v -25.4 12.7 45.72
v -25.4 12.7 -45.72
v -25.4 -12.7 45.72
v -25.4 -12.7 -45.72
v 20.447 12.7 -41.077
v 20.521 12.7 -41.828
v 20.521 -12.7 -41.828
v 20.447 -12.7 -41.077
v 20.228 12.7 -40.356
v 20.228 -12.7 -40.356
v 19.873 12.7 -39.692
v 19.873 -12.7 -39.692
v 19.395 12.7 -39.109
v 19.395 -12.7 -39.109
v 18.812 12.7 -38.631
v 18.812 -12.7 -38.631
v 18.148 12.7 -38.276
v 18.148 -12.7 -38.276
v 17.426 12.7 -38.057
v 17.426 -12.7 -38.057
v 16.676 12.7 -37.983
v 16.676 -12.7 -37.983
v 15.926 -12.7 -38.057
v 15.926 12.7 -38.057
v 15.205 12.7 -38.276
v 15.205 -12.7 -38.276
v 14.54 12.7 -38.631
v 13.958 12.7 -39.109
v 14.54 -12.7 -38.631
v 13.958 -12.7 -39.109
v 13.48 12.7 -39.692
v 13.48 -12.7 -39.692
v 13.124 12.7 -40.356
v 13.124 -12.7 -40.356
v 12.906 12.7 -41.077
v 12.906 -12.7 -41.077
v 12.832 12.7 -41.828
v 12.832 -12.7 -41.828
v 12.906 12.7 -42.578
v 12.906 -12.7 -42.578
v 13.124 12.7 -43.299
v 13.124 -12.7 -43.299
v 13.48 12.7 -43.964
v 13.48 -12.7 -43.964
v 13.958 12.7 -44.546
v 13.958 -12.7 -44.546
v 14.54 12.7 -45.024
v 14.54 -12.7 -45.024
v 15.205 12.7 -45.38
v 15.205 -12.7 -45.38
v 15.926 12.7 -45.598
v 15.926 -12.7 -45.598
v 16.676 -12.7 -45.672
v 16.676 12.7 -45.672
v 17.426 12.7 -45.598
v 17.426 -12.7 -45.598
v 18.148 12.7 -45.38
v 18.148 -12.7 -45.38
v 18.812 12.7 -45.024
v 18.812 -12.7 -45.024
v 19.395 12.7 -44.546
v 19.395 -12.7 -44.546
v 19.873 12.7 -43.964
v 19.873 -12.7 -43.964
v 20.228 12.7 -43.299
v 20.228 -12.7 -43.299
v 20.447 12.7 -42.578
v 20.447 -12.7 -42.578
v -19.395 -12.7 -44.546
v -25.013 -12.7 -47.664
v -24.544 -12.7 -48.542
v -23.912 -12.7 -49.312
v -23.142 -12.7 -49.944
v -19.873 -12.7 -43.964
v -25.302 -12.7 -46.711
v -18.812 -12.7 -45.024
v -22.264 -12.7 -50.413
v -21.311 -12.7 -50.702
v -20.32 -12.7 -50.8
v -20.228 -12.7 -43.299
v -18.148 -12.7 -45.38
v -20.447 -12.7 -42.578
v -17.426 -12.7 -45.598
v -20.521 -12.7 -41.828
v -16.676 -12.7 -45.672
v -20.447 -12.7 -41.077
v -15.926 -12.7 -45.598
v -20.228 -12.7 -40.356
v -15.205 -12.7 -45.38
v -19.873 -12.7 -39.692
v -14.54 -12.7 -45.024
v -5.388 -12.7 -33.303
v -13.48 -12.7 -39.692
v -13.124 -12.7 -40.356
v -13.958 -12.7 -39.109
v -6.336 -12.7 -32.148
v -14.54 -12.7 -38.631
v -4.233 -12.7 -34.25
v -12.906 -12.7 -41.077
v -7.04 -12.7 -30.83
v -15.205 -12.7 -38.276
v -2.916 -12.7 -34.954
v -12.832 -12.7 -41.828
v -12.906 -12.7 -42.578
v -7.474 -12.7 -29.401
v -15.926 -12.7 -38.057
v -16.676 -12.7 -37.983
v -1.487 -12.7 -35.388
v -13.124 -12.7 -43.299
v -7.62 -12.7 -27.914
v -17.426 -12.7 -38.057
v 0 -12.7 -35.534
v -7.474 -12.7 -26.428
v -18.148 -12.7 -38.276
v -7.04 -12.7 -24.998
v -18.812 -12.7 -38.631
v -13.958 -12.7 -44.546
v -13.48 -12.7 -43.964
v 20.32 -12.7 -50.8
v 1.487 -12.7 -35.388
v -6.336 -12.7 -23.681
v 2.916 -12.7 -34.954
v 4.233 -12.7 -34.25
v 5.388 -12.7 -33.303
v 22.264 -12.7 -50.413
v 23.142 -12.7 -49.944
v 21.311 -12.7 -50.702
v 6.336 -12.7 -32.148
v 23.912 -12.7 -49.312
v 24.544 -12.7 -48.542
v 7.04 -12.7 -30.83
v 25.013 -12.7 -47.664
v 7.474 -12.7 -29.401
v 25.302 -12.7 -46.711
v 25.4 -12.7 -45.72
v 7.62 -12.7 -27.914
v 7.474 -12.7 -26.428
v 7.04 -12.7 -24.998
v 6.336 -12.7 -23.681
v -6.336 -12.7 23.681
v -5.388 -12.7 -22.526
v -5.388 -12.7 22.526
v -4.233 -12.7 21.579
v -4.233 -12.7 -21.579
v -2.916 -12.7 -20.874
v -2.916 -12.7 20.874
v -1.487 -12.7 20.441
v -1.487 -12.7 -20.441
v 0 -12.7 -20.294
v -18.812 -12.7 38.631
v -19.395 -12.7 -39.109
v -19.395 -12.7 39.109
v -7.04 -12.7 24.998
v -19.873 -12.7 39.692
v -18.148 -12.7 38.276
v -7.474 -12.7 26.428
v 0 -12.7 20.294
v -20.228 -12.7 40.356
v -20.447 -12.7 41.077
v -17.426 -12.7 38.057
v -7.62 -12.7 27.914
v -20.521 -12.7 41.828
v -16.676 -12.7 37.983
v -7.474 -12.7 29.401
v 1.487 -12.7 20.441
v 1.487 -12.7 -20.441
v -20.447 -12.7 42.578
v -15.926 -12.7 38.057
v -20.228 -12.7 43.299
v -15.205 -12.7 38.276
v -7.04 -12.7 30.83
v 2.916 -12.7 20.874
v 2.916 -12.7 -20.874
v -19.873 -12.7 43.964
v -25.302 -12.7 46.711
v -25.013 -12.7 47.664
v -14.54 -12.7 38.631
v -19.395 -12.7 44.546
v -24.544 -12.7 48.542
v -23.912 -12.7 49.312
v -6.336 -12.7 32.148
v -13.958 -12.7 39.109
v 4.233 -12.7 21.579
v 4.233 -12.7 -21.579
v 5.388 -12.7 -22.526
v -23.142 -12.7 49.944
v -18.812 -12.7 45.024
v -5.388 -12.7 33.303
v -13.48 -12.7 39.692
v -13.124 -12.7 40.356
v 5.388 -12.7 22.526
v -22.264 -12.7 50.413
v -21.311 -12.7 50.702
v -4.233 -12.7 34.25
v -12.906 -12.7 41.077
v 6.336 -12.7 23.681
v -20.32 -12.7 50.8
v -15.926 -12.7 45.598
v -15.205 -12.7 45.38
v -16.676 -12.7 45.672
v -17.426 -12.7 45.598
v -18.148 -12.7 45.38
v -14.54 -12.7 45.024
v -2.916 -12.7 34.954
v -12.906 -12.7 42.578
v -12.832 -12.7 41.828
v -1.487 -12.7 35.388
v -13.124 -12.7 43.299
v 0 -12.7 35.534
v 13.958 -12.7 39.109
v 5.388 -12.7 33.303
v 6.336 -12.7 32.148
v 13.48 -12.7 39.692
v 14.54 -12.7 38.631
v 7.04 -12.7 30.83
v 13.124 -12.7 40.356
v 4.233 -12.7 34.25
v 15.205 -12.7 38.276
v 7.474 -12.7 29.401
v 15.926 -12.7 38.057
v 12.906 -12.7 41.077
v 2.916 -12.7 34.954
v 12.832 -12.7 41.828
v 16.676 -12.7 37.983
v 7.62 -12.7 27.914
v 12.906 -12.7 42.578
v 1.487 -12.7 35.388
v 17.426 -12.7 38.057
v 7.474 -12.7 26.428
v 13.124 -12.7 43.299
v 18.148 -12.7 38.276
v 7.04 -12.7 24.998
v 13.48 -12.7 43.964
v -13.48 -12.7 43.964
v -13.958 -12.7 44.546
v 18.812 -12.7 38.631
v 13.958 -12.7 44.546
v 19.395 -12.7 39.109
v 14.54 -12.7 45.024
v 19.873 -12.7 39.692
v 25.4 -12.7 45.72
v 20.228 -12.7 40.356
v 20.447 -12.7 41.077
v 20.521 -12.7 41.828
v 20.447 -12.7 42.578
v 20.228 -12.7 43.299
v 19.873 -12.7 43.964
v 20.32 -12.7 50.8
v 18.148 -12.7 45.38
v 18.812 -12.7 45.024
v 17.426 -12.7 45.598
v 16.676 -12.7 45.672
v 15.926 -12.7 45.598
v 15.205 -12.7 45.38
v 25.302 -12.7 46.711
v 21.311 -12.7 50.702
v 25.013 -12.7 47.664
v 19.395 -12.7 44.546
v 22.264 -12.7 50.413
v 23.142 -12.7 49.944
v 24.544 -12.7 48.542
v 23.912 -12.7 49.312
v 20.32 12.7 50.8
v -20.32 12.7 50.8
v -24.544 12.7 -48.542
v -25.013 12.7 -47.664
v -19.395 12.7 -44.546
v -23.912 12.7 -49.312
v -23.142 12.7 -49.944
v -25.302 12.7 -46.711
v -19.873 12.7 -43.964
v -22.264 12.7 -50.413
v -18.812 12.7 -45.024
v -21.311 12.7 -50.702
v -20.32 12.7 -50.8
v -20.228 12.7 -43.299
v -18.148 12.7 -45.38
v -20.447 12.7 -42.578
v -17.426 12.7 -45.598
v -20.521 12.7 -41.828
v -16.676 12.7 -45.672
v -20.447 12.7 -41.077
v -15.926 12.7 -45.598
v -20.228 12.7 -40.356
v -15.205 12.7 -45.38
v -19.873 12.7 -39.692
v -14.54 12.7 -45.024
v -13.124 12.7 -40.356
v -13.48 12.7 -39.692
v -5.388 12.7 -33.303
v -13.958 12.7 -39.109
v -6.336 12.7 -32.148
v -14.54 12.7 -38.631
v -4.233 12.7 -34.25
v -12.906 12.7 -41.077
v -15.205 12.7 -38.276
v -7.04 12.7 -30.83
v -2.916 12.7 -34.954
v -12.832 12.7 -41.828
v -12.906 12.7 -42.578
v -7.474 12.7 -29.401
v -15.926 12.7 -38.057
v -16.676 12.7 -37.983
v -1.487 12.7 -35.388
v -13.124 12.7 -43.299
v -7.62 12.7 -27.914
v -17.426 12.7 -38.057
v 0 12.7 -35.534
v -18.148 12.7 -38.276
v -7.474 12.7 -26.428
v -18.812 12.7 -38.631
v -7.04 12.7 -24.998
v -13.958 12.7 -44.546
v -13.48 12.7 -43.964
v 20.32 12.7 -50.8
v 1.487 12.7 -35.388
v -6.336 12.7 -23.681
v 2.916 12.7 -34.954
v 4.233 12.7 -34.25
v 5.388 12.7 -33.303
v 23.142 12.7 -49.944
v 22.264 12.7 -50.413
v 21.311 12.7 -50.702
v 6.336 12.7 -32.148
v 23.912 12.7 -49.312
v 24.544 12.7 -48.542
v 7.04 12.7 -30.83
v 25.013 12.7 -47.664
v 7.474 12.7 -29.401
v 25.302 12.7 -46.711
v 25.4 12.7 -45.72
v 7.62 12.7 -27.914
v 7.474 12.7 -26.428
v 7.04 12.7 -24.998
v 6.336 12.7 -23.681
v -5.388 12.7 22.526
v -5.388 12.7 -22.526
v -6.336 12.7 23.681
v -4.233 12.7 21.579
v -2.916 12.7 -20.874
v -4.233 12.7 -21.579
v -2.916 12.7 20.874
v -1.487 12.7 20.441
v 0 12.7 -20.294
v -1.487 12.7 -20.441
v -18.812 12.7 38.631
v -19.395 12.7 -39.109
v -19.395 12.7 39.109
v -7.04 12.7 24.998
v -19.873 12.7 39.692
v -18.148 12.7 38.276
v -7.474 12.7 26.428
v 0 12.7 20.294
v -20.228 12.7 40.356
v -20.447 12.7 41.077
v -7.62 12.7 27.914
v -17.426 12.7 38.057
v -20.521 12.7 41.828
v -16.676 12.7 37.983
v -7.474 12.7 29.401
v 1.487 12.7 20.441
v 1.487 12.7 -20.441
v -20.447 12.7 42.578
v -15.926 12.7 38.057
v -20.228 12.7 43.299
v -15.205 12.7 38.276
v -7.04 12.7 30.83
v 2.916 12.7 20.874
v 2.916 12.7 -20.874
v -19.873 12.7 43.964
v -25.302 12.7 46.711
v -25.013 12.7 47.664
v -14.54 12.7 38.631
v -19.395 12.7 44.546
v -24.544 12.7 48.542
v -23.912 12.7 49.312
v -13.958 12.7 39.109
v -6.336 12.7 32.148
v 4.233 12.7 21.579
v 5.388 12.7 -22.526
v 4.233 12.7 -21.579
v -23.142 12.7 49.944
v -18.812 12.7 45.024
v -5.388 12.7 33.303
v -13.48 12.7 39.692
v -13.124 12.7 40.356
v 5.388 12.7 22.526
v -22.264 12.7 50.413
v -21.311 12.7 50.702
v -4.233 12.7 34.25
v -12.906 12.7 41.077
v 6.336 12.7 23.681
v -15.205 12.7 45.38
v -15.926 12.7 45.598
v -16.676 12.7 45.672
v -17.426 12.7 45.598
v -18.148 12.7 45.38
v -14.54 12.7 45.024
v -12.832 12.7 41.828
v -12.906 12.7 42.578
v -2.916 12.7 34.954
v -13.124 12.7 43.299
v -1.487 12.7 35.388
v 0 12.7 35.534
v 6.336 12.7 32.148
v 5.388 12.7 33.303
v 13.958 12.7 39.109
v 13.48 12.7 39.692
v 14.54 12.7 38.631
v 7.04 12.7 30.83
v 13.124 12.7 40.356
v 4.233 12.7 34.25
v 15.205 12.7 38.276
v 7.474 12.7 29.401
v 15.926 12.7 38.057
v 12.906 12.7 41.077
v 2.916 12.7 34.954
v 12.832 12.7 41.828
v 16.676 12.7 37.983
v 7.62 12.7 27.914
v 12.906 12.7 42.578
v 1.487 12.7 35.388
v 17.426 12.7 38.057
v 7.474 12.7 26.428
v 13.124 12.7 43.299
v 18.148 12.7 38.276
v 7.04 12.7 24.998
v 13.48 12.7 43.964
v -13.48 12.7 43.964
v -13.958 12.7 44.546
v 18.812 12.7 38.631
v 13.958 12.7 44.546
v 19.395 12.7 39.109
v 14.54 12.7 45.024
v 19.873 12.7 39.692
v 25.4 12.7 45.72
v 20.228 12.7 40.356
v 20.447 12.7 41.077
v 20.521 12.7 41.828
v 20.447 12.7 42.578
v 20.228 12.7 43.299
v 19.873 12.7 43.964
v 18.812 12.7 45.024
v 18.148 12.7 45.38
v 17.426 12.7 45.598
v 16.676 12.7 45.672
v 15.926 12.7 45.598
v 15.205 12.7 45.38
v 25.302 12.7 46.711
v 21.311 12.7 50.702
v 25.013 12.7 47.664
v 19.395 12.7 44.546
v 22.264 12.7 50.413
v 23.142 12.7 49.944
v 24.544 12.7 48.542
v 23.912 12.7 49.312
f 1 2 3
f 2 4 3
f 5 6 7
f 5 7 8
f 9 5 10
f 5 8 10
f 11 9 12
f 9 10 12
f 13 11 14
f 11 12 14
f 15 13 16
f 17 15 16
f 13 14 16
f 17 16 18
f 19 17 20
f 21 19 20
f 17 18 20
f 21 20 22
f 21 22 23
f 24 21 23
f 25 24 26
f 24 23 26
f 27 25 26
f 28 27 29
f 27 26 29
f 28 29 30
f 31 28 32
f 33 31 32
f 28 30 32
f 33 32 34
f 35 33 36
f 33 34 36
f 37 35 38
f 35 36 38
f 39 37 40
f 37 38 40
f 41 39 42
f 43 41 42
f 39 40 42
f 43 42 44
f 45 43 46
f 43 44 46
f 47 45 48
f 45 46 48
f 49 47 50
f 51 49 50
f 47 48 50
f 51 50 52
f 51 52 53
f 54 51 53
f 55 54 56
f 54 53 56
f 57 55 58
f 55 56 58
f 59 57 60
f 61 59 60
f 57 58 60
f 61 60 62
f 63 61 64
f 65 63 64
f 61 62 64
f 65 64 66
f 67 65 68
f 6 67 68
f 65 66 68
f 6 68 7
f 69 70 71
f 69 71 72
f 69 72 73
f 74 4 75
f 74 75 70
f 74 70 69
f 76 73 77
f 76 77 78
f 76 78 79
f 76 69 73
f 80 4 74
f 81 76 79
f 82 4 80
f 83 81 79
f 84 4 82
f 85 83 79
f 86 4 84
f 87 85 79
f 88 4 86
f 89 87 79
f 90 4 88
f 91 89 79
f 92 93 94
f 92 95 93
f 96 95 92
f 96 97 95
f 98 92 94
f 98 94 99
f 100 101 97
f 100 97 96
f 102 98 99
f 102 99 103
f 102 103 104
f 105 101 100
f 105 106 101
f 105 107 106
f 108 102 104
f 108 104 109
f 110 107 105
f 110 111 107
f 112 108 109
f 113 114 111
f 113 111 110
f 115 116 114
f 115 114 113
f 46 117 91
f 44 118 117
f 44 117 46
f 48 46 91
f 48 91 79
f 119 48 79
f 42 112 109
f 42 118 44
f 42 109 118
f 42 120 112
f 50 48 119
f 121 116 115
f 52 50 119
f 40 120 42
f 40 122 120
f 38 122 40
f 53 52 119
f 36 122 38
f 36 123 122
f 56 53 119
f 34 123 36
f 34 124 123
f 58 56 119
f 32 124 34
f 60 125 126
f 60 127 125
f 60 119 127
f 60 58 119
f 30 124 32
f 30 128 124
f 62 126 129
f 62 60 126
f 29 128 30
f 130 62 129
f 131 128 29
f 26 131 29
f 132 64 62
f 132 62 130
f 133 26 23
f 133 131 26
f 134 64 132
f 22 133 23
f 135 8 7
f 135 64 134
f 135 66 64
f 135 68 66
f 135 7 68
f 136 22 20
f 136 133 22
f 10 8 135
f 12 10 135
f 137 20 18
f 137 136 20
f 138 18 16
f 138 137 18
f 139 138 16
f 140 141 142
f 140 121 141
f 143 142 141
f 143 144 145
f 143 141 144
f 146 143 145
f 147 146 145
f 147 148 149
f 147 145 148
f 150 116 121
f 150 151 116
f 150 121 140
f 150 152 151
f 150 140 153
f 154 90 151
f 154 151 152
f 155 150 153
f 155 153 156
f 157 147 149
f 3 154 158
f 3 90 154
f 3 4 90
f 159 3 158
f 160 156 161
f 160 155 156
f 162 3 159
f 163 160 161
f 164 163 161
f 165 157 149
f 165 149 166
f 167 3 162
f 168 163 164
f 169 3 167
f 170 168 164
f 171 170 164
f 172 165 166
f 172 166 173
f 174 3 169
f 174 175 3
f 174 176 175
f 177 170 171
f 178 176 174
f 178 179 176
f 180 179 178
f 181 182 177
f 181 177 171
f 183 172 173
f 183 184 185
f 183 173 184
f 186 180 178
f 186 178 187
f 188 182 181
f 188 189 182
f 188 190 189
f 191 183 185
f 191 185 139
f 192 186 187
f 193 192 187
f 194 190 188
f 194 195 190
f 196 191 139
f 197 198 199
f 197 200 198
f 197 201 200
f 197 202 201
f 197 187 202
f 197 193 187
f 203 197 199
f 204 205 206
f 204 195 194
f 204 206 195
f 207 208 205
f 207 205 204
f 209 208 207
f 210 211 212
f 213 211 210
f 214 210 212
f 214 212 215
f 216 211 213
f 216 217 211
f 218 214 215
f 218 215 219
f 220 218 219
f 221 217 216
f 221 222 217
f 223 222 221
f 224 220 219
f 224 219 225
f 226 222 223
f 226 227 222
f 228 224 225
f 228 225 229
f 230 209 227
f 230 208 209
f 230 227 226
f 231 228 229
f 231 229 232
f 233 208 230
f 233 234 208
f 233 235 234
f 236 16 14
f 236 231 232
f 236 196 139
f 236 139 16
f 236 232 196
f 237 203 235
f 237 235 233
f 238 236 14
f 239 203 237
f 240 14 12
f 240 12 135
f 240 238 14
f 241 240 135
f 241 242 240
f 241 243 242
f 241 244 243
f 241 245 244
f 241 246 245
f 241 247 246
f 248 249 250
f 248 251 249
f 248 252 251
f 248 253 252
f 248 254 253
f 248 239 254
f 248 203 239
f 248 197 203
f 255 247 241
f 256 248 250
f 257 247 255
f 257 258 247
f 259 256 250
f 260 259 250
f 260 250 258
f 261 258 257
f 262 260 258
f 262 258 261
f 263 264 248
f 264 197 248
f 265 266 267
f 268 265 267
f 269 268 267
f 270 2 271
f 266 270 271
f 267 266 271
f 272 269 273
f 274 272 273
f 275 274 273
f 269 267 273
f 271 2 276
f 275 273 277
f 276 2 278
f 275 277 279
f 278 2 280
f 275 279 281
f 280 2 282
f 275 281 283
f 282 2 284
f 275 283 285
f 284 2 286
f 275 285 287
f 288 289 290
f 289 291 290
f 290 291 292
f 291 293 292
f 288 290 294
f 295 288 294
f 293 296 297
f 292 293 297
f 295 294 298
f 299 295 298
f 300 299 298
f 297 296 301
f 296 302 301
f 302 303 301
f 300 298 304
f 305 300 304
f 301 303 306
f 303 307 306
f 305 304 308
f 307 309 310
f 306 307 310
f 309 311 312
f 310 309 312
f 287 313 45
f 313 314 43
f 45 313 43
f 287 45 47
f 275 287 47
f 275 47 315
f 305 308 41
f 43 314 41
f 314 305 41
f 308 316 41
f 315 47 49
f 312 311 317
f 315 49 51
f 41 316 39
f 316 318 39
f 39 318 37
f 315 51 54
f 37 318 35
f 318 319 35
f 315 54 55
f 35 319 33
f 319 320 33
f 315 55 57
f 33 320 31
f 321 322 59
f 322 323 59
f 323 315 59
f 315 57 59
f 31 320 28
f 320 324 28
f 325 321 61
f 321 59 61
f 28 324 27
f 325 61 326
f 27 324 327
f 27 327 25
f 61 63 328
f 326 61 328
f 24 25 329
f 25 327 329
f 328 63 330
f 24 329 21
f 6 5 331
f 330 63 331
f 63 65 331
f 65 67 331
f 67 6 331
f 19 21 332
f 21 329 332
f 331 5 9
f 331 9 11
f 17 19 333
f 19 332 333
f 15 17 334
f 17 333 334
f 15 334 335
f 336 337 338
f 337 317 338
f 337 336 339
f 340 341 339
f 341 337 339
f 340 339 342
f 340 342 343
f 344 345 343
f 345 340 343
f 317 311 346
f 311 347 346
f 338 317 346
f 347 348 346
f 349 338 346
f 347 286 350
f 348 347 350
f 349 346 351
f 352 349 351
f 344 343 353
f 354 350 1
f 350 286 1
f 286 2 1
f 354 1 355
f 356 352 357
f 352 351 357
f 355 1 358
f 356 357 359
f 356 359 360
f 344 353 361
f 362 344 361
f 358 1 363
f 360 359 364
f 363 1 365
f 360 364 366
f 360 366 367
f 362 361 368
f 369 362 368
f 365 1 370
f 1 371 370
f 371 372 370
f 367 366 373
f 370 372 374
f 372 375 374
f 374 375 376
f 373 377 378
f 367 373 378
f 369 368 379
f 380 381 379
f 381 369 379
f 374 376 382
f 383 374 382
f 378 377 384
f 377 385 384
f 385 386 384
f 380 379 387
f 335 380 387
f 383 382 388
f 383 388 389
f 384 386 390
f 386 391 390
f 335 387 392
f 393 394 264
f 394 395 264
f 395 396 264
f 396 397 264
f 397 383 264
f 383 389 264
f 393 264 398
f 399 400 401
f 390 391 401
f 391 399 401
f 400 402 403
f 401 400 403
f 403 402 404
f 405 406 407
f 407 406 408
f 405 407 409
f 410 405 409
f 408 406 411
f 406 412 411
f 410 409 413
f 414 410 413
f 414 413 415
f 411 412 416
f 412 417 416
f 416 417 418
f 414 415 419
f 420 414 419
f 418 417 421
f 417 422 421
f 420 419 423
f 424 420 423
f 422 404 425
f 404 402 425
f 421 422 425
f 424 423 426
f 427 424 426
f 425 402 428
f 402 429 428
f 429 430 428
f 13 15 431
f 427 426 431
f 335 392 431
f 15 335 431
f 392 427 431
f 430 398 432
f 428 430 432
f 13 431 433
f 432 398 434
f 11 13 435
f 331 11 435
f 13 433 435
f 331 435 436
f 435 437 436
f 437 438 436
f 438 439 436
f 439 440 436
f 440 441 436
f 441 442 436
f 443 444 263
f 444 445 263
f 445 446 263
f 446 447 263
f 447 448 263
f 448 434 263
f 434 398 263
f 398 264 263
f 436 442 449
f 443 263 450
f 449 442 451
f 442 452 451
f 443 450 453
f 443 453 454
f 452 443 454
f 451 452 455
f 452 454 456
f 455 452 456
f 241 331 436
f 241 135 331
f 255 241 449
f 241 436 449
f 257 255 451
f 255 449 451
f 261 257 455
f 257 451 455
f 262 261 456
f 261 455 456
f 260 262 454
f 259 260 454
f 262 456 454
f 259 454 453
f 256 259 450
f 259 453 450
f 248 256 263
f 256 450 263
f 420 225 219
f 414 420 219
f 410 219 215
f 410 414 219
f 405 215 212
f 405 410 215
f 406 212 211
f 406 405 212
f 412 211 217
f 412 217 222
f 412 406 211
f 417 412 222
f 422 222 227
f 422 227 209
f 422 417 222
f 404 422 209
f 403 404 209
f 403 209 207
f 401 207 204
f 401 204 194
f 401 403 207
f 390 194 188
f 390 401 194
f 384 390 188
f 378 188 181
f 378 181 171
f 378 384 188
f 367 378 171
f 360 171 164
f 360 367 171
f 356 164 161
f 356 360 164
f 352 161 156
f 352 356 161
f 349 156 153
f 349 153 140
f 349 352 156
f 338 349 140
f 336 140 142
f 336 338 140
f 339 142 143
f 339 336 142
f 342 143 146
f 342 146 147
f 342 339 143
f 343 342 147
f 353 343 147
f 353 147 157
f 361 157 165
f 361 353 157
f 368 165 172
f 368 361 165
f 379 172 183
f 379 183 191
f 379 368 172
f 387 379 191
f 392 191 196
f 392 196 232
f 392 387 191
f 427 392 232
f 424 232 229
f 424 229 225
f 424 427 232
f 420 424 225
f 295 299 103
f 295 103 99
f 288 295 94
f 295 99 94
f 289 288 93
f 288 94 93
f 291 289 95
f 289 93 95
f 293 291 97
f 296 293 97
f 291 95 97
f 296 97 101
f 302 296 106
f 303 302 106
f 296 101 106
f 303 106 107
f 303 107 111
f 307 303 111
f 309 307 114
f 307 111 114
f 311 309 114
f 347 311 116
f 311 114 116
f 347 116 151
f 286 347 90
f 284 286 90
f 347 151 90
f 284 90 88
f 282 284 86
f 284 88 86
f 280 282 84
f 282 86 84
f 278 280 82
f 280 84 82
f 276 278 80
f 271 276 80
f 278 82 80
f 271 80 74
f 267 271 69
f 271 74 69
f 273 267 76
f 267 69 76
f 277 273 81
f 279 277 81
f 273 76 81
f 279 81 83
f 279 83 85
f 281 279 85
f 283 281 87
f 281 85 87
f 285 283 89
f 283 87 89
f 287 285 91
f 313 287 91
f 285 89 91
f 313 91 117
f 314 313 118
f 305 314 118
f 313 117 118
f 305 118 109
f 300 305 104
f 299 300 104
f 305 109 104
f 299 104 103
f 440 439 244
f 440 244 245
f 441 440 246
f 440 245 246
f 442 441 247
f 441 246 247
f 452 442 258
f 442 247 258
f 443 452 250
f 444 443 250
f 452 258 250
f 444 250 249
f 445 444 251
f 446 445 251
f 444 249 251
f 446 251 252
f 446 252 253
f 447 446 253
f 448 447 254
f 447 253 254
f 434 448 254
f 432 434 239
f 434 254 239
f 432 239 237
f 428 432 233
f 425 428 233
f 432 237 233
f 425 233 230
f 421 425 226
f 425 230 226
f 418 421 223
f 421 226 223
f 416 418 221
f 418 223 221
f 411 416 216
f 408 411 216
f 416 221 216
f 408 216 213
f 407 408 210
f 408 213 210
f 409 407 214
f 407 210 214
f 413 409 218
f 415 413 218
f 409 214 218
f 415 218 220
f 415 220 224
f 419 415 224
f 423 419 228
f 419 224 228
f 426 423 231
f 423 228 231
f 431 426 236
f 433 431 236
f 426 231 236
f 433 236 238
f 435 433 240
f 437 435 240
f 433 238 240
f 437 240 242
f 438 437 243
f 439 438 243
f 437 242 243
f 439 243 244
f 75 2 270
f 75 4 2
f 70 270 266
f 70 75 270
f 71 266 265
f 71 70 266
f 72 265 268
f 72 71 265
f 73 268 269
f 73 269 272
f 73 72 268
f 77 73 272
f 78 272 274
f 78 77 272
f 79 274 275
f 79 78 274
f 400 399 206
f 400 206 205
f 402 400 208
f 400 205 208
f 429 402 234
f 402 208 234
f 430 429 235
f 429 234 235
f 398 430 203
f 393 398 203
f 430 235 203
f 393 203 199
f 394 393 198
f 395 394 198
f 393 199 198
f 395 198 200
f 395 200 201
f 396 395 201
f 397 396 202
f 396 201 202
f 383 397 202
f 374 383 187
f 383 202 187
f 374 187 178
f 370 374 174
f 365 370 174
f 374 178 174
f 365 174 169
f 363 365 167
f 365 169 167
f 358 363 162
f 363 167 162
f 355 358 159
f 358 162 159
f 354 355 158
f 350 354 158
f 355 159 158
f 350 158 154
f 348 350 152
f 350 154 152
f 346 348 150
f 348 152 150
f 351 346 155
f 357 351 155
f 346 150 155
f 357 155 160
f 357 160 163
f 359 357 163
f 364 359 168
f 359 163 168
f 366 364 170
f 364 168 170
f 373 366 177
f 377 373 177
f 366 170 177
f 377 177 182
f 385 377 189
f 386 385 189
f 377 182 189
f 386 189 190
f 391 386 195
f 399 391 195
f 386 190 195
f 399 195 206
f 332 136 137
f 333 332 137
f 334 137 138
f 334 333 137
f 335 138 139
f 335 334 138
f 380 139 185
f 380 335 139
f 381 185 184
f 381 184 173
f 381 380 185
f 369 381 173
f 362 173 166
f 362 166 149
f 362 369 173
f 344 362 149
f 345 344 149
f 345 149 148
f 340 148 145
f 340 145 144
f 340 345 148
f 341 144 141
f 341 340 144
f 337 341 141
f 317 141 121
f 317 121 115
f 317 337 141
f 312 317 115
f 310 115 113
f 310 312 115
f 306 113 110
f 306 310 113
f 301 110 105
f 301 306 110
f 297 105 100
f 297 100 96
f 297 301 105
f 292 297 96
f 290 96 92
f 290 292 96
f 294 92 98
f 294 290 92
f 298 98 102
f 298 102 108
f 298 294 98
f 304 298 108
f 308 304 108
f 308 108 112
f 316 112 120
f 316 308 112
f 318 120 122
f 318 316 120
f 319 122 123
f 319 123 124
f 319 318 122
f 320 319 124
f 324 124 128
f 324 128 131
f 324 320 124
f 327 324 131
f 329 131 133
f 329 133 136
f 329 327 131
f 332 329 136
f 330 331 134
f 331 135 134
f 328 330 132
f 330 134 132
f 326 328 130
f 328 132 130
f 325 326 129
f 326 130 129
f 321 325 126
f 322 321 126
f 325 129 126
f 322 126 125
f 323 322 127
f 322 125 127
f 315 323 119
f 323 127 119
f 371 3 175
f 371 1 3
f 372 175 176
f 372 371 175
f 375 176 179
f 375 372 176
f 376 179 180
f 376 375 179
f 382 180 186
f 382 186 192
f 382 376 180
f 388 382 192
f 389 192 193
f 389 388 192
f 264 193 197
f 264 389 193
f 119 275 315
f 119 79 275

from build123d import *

# Parameters (mm, degrees)
F0_W     = 50.8
F0_H     = 101.6
F0_R     = 7.62
F1_DEPTH = 12.7
F2_R     = 5.08
F3_R     = 3.844677
F4_DEPTH = 25.4


with BuildPart() as f1:
    # F0 (on Front) → F1 (new body, symmetric)
    with BuildSketch(Plane.XZ):
        Rectangle(F0_W, F0_H)
        with Locations((0, -27.914425)):
            Circle(F0_R, mode=Mode.SUBTRACT)
        with Locations((0, 27.914425)):
            Circle(F0_R, mode=Mode.SUBTRACT)
    extrude(amount=F1_DEPTH, both=True)

    # F2
    f2_edges = [f1.edges().sort_by_distance(p)[0] for p in [
        (25.4, 0, 50.8),
        (25.4, 0, -50.8),
        (-25.4, 0, -50.8),
        (-25.4, 0, 50.8),
    ]]
    fillet(f2_edges, radius=F2_R)

    # F3 (on face) → F4 (cut)
    with BuildSketch(Plane.XZ.offset(12.7)):
        with Locations((-16.676344, 41.827552)):
            Circle(F3_R)
        with Locations((16.676344, 41.827552)):
            Circle(F3_R)
        with Locations((-16.676344, -41.827552)):
            Circle(F3_R)
        with Locations((16.676344, -41.827552)):
            Circle(F3_R)
    extrude(amount=-F4_DEPTH, mode=Mode.SUBTRACT)


solid = f1.part
